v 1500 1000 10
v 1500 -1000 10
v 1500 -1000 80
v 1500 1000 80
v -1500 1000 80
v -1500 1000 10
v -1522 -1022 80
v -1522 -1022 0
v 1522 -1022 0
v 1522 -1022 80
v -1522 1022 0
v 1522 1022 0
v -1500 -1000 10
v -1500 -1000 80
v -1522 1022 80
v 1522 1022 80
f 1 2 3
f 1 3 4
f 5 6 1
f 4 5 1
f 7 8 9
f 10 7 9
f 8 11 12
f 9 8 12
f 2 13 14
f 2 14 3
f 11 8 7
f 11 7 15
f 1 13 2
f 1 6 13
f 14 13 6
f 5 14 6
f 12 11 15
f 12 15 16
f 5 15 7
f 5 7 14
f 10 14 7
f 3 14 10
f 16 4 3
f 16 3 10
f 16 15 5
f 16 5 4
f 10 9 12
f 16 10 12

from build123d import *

# Parameters (mm, degrees)
SKETCH1_W           = 3044
SKETCH1_H           = 2044
BOSS_EXTRUDE1_DEPTH = 10
SKETCH1_3_W         = 3044
SKETCH1_3_H         = 2044
SKETCH1_3_W_2       = 3000
SKETCH1_3_H_2       = 2000
BOSS_EXTRUDE2_DEPTH = 80


with BuildPart() as part:
    # Sketch1 → Boss-Extrude1 (new body)
    with BuildSketch(Plane.XY):
        Rectangle(SKETCH1_W, SKETCH1_H)
    extrude(amount=BOSS_EXTRUDE1_DEPTH)

    # Sketch1<3> → Boss-Extrude2 (add)
    with BuildSketch(Plane.XY):
        Rectangle(SKETCH1_3_W, SKETCH1_3_H)
        Rectangle(SKETCH1_3_W_2, SKETCH1_3_H_2, mode=Mode.SUBTRACT)
    extrude(amount=BOSS_EXTRUDE2_DEPTH)


solid = part.part
